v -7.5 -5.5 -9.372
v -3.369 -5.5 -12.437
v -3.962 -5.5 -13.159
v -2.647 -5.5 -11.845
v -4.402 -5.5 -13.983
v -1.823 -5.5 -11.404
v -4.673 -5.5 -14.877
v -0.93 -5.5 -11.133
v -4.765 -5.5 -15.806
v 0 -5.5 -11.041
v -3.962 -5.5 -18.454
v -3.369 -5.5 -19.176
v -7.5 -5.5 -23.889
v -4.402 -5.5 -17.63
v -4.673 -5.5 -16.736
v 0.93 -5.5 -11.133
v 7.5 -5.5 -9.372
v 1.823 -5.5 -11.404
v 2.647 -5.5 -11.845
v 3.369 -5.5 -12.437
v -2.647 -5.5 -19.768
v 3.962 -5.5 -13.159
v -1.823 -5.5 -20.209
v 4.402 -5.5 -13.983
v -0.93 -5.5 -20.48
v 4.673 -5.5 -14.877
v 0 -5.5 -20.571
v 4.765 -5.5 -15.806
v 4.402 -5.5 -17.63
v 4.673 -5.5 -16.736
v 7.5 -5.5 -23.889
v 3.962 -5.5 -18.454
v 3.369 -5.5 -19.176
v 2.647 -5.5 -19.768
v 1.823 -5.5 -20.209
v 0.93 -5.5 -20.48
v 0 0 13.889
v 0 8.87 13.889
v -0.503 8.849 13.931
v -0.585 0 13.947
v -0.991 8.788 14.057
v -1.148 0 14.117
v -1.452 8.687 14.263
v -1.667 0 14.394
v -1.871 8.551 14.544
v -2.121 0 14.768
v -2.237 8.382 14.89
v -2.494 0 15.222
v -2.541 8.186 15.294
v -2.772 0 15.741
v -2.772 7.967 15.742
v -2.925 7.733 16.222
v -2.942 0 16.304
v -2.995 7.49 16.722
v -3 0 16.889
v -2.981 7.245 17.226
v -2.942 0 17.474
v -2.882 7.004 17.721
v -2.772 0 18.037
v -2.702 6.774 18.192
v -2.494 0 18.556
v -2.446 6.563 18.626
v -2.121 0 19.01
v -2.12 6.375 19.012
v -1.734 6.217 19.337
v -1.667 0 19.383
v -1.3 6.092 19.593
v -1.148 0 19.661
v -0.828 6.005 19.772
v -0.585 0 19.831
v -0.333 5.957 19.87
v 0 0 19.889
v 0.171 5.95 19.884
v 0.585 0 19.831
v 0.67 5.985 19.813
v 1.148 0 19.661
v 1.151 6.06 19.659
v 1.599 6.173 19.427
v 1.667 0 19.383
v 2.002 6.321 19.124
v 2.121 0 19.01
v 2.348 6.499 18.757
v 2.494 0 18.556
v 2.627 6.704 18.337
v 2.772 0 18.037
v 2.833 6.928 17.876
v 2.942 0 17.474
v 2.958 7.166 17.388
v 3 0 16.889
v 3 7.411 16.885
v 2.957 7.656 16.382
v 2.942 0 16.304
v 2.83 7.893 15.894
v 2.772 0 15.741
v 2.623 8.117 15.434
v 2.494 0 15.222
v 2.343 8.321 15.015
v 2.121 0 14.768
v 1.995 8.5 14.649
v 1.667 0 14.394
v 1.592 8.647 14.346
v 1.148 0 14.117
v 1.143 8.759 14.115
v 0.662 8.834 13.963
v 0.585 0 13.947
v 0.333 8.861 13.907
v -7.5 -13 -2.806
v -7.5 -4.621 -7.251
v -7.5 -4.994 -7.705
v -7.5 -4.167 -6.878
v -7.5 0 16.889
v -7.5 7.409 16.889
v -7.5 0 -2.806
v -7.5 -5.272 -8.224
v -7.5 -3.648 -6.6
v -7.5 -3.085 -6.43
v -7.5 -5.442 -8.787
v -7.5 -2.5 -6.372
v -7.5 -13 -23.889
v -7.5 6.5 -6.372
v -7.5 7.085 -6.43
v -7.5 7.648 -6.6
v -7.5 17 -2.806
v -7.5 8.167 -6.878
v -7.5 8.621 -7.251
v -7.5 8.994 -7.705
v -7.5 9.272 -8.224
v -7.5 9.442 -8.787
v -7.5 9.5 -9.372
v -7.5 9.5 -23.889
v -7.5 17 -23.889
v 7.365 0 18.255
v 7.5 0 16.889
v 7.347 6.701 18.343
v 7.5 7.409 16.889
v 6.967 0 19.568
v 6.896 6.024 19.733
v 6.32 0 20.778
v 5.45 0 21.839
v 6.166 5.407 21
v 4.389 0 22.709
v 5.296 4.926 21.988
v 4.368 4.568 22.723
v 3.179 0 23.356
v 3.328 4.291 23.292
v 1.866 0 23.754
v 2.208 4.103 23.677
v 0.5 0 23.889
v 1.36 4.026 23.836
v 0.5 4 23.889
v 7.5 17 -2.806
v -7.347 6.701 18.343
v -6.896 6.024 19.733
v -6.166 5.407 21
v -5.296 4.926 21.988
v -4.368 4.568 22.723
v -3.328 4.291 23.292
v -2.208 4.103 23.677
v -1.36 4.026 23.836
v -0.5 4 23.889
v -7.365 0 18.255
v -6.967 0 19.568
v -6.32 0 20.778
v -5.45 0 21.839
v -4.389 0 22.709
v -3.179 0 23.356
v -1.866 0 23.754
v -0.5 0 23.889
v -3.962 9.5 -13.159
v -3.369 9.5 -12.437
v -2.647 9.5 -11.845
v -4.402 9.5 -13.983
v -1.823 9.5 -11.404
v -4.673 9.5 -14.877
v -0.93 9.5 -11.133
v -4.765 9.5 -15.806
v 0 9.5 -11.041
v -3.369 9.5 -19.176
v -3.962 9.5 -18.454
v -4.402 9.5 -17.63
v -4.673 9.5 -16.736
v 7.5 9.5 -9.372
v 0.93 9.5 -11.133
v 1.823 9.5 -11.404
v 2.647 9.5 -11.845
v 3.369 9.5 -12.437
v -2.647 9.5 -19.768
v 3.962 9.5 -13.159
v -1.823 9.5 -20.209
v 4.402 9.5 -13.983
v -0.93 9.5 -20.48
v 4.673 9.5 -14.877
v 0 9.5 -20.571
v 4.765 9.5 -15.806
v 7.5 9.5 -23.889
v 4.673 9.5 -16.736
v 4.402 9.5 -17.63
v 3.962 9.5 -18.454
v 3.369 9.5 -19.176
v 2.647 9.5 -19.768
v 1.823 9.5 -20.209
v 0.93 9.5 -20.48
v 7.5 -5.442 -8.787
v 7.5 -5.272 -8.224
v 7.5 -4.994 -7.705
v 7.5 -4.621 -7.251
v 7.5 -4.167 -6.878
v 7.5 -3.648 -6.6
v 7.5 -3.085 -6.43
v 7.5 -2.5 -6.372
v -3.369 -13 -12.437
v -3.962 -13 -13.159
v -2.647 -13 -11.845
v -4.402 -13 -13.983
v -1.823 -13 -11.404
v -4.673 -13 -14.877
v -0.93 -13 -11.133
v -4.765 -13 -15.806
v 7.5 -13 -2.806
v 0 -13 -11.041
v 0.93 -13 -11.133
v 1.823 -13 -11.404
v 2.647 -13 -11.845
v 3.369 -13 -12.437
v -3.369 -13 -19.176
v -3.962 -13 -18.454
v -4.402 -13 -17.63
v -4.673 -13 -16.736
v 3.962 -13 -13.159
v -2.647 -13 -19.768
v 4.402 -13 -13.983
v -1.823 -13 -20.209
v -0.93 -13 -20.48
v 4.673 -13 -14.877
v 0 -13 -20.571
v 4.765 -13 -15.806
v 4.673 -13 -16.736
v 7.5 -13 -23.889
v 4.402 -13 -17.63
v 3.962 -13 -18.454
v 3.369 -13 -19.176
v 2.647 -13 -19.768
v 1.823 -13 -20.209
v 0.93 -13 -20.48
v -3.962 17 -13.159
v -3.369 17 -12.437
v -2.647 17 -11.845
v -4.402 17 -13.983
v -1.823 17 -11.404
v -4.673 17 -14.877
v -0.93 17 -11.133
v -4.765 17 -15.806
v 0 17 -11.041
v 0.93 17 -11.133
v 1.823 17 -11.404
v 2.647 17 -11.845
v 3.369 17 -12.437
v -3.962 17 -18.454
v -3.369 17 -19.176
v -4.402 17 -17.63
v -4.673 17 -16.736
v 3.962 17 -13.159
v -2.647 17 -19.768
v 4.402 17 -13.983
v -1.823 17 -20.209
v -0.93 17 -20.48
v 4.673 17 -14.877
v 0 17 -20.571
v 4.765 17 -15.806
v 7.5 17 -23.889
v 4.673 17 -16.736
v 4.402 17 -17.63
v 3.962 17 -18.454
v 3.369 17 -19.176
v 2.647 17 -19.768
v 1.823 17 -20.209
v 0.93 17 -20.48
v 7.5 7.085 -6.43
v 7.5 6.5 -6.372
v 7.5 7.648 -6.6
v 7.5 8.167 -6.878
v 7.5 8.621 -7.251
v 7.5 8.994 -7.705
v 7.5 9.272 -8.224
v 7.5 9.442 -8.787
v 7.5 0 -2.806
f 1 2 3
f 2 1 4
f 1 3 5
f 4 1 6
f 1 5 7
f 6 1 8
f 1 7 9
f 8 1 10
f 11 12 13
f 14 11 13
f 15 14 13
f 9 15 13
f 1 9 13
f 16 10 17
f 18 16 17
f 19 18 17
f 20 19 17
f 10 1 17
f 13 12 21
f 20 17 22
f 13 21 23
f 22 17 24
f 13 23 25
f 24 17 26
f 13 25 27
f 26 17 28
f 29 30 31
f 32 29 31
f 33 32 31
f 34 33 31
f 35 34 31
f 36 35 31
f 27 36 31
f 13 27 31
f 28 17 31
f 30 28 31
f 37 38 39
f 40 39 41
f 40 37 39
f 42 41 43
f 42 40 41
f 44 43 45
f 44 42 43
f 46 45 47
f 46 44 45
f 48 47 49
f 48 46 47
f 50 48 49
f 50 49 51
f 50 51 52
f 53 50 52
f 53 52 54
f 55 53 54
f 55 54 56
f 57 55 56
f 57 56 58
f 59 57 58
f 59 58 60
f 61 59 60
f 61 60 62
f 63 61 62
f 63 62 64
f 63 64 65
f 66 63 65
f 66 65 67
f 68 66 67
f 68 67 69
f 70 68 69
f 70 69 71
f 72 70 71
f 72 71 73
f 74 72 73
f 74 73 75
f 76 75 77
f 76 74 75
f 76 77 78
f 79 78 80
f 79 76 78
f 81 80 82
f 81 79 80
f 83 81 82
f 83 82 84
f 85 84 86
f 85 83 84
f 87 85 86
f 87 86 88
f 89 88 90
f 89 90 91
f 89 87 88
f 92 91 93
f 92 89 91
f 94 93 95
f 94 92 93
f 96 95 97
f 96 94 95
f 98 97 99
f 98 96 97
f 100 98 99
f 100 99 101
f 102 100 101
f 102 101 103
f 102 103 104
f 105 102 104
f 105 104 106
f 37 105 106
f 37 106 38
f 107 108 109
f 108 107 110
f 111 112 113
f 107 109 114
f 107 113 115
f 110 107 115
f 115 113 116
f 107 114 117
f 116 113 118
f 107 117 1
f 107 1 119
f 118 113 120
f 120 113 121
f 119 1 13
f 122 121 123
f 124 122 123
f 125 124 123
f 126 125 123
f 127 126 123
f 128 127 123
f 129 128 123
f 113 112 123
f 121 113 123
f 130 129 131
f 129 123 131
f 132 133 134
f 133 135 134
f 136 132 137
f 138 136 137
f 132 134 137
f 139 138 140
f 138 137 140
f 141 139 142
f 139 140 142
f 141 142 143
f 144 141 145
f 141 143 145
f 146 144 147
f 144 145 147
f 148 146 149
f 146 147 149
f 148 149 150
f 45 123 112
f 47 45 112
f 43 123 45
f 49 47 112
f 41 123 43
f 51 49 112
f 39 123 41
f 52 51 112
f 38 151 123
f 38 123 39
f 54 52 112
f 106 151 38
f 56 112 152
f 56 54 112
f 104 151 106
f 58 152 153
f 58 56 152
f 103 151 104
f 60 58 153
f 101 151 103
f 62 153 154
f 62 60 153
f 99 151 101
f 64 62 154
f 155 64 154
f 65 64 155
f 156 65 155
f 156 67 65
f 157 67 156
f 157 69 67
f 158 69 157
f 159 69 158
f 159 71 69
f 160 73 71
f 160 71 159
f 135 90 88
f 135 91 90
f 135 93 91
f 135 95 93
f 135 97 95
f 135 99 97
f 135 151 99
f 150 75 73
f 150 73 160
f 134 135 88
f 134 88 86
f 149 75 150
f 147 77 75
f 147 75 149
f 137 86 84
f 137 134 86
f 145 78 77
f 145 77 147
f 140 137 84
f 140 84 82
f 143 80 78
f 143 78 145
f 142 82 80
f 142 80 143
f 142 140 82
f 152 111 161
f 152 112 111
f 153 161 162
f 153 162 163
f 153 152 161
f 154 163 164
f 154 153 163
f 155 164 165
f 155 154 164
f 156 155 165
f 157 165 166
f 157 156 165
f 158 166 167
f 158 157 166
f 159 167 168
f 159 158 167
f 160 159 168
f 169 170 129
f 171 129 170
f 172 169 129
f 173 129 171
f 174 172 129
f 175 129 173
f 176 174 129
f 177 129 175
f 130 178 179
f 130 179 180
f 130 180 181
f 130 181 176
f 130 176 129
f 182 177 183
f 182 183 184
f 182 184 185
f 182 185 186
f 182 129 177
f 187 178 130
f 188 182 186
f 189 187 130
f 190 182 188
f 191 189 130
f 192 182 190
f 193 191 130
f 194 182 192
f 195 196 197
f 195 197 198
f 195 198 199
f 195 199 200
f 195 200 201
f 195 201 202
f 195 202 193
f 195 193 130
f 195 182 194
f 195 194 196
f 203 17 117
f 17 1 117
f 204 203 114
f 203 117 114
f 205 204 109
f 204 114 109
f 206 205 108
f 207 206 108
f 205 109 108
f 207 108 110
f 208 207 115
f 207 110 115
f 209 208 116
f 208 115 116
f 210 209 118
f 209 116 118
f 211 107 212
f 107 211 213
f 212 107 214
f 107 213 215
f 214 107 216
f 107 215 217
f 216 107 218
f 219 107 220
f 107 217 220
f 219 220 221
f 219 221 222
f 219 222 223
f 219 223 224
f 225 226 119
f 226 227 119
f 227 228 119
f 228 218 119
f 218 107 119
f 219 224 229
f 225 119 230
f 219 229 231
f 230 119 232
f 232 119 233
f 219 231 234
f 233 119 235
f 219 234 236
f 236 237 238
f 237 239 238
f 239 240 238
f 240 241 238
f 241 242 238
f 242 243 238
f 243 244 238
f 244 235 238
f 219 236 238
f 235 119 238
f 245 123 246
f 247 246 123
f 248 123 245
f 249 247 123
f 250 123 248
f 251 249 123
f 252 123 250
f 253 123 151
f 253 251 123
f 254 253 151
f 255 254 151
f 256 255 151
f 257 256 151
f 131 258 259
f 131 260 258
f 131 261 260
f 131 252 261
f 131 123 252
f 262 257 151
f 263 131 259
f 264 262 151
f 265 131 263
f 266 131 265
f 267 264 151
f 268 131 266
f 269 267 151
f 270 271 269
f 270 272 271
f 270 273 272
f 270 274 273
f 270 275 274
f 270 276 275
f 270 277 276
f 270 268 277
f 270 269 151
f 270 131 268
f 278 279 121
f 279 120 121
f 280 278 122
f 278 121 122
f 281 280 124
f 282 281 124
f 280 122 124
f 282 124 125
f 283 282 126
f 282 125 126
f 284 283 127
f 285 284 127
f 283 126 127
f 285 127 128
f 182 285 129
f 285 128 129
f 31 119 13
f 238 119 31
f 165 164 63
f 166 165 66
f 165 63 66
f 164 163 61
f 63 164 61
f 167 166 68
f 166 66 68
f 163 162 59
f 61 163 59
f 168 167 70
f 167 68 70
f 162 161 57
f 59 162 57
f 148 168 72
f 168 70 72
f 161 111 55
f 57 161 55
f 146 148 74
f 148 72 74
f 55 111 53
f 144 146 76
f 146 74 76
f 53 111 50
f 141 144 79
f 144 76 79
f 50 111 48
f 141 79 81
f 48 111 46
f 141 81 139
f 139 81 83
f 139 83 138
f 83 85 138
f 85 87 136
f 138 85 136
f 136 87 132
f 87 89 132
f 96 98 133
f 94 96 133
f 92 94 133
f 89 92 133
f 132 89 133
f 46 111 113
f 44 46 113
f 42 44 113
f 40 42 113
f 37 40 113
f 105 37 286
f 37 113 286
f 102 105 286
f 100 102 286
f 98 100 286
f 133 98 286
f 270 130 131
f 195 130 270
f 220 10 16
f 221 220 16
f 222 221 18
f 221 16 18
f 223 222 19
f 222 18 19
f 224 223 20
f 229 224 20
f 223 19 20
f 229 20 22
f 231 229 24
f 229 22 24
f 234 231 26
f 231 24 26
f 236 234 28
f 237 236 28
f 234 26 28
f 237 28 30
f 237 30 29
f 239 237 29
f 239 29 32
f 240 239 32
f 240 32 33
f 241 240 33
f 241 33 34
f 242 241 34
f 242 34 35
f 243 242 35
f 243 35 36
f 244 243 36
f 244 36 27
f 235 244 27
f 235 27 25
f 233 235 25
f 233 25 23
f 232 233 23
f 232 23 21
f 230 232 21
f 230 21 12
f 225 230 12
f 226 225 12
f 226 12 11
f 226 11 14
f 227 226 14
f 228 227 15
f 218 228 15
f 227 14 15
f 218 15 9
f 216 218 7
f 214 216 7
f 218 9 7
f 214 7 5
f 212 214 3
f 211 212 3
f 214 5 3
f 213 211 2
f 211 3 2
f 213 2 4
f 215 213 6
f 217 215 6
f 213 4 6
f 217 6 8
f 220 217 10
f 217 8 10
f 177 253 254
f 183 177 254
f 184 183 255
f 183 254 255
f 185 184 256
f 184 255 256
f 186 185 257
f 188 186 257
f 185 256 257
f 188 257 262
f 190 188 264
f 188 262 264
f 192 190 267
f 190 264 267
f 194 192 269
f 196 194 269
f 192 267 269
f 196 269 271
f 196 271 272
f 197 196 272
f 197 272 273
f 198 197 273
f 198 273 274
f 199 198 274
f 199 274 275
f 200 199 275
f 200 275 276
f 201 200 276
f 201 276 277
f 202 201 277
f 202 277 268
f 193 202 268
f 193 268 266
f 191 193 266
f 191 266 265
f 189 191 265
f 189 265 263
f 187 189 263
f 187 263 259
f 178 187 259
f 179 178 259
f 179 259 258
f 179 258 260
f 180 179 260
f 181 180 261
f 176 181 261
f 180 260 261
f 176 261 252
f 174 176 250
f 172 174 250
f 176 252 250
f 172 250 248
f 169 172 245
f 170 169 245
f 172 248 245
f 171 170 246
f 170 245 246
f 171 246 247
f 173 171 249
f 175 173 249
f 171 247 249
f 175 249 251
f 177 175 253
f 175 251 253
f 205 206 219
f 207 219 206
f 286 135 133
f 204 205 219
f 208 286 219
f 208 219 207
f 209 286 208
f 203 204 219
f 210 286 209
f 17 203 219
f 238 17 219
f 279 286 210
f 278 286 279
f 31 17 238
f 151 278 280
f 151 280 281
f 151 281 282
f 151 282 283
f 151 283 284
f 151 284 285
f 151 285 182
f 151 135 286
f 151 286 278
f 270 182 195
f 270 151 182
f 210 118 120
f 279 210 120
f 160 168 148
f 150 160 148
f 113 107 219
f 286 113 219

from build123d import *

# Parameters (mm, degrees)
SKETCH1_W                = 15
SKETCH1_H                = 47.7777777
BOSS_EXTRUDE1_DEPTH      = 4
BOSS_EXTRUDE3_DEPTH      = 13
BOSS_EXTRUDE3_DEPTH_BACK = 17
SKETCH10_W               = 15
SKETCH10_H               = 21.082393169
SKETCH11_W               = 17.516789228
SKETCH11_H               = 15
CUT_EXTRUDE4_DEPTH       = 33.934465389
SKETCH12_R               = 4.765
CUT_EXTRUDE5_DEPTH       = 40.075939022
FILLET3_R                = 3
BOSS_EXTRUDE5_DEPTH      = 15
CUT_EXTRUDE7_DEPTH       = 31.264319098
CUT_EXTRUDE7_DEPTH_BACK  = 31.264319098
SKETCH3_R                = 3
FILLET4_R                = 7


with BuildPart() as part:
    # Sketch1 → Boss-Extrude1 (new body)
    with BuildSketch(Plane(origin=(0, 0, 0), x_dir=(1, 0, 0), z_dir=(0, 1, 0))):
        Rectangle(SKETCH1_W, SKETCH1_H)
    extrude(amount=BOSS_EXTRUDE1_DEPTH)

    # Sketch10 → Boss-Extrude3 (add, two sides: drawn at the far end of the back side and taken through both)
    with BuildSketch(Plane(origin=(0, 4, 0), x_dir=(1, 0, 0), z_dir=(0, 1, 0)).offset(-BOSS_EXTRUDE3_DEPTH_BACK)):
        with Locations((0, 13.347692266)):
            Rectangle(SKETCH10_W, SKETCH10_H)
    extrude(amount=BOSS_EXTRUDE3_DEPTH + BOSS_EXTRUDE3_DEPTH_BACK)

    # Sketch11 → Cut-Extrude4 (cut, through all)
    with BuildSketch(Plane(origin=(7.5, 0, 0), x_dir=(0, 0, -1), z_dir=(1, 0, 0))):
        with Locations((15.130494236, 2)):
            Rectangle(SKETCH11_W, SKETCH11_H)
    extrude(amount=-CUT_EXTRUDE4_DEPTH, mode=Mode.SUBTRACT)

    # Sketch12 → Cut-Extrude5 (cut, through all)
    with BuildSketch(Plane(origin=(0, 17, 0), x_dir=(1, 0, 0), z_dir=(0, 1, 0))):
        with Locations(Location((0, 15.806495681, 0), (0, 0, 270))):
            Circle(SKETCH12_R)
    extrude(amount=-CUT_EXTRUDE5_DEPTH, mode=Mode.SUBTRACT)

    # Fillet3
    fillet3_edges = [part.edges().sort_by_distance(p)[0] for p in [
        (0, -5.5, -6.372099622),
        (0, 9.5, -6.372099622),
    ]]
    fillet(fillet3_edges, radius=FILLET3_R)

    # Sketch14 → Boss-Extrude5 (add)
    with BuildSketch(Plane(origin=(7.5, 0, 0), x_dir=(0, 0, -1), z_dir=(1, 0, 0))):
        Polygon((2.806495681, 17), (-23.88888885, 4), (2.806495681, 4), align=None)
    extrude(amount=-BOSS_EXTRUDE5_DEPTH)

    # Sketch3 → Cut-Extrude7 (cut, two sides: drawn at the far end of the back side and taken through both)
    with BuildSketch(Plane(origin=(0, 4, 0), x_dir=(1, 0, 0), z_dir=(0, 1, 0)).offset(-CUT_EXTRUDE7_DEPTH_BACK)):
        with Locations(Location((0, -16.88888885, 0), (0, 0, 90))):
            Circle(SKETCH3_R)
    extrude(amount=CUT_EXTRUDE7_DEPTH + CUT_EXTRUDE7_DEPTH_BACK, mode=Mode.SUBTRACT)

    # Fillet4
    fillet4_edges = [part.edges().sort_by_distance(p)[0] for p in [
        (7.5, 2, 23.88888885),
        (-7.5, 2, 23.88888885),
    ]]
    fillet(fillet4_edges, radius=FILLET4_R)


solid = part.part
